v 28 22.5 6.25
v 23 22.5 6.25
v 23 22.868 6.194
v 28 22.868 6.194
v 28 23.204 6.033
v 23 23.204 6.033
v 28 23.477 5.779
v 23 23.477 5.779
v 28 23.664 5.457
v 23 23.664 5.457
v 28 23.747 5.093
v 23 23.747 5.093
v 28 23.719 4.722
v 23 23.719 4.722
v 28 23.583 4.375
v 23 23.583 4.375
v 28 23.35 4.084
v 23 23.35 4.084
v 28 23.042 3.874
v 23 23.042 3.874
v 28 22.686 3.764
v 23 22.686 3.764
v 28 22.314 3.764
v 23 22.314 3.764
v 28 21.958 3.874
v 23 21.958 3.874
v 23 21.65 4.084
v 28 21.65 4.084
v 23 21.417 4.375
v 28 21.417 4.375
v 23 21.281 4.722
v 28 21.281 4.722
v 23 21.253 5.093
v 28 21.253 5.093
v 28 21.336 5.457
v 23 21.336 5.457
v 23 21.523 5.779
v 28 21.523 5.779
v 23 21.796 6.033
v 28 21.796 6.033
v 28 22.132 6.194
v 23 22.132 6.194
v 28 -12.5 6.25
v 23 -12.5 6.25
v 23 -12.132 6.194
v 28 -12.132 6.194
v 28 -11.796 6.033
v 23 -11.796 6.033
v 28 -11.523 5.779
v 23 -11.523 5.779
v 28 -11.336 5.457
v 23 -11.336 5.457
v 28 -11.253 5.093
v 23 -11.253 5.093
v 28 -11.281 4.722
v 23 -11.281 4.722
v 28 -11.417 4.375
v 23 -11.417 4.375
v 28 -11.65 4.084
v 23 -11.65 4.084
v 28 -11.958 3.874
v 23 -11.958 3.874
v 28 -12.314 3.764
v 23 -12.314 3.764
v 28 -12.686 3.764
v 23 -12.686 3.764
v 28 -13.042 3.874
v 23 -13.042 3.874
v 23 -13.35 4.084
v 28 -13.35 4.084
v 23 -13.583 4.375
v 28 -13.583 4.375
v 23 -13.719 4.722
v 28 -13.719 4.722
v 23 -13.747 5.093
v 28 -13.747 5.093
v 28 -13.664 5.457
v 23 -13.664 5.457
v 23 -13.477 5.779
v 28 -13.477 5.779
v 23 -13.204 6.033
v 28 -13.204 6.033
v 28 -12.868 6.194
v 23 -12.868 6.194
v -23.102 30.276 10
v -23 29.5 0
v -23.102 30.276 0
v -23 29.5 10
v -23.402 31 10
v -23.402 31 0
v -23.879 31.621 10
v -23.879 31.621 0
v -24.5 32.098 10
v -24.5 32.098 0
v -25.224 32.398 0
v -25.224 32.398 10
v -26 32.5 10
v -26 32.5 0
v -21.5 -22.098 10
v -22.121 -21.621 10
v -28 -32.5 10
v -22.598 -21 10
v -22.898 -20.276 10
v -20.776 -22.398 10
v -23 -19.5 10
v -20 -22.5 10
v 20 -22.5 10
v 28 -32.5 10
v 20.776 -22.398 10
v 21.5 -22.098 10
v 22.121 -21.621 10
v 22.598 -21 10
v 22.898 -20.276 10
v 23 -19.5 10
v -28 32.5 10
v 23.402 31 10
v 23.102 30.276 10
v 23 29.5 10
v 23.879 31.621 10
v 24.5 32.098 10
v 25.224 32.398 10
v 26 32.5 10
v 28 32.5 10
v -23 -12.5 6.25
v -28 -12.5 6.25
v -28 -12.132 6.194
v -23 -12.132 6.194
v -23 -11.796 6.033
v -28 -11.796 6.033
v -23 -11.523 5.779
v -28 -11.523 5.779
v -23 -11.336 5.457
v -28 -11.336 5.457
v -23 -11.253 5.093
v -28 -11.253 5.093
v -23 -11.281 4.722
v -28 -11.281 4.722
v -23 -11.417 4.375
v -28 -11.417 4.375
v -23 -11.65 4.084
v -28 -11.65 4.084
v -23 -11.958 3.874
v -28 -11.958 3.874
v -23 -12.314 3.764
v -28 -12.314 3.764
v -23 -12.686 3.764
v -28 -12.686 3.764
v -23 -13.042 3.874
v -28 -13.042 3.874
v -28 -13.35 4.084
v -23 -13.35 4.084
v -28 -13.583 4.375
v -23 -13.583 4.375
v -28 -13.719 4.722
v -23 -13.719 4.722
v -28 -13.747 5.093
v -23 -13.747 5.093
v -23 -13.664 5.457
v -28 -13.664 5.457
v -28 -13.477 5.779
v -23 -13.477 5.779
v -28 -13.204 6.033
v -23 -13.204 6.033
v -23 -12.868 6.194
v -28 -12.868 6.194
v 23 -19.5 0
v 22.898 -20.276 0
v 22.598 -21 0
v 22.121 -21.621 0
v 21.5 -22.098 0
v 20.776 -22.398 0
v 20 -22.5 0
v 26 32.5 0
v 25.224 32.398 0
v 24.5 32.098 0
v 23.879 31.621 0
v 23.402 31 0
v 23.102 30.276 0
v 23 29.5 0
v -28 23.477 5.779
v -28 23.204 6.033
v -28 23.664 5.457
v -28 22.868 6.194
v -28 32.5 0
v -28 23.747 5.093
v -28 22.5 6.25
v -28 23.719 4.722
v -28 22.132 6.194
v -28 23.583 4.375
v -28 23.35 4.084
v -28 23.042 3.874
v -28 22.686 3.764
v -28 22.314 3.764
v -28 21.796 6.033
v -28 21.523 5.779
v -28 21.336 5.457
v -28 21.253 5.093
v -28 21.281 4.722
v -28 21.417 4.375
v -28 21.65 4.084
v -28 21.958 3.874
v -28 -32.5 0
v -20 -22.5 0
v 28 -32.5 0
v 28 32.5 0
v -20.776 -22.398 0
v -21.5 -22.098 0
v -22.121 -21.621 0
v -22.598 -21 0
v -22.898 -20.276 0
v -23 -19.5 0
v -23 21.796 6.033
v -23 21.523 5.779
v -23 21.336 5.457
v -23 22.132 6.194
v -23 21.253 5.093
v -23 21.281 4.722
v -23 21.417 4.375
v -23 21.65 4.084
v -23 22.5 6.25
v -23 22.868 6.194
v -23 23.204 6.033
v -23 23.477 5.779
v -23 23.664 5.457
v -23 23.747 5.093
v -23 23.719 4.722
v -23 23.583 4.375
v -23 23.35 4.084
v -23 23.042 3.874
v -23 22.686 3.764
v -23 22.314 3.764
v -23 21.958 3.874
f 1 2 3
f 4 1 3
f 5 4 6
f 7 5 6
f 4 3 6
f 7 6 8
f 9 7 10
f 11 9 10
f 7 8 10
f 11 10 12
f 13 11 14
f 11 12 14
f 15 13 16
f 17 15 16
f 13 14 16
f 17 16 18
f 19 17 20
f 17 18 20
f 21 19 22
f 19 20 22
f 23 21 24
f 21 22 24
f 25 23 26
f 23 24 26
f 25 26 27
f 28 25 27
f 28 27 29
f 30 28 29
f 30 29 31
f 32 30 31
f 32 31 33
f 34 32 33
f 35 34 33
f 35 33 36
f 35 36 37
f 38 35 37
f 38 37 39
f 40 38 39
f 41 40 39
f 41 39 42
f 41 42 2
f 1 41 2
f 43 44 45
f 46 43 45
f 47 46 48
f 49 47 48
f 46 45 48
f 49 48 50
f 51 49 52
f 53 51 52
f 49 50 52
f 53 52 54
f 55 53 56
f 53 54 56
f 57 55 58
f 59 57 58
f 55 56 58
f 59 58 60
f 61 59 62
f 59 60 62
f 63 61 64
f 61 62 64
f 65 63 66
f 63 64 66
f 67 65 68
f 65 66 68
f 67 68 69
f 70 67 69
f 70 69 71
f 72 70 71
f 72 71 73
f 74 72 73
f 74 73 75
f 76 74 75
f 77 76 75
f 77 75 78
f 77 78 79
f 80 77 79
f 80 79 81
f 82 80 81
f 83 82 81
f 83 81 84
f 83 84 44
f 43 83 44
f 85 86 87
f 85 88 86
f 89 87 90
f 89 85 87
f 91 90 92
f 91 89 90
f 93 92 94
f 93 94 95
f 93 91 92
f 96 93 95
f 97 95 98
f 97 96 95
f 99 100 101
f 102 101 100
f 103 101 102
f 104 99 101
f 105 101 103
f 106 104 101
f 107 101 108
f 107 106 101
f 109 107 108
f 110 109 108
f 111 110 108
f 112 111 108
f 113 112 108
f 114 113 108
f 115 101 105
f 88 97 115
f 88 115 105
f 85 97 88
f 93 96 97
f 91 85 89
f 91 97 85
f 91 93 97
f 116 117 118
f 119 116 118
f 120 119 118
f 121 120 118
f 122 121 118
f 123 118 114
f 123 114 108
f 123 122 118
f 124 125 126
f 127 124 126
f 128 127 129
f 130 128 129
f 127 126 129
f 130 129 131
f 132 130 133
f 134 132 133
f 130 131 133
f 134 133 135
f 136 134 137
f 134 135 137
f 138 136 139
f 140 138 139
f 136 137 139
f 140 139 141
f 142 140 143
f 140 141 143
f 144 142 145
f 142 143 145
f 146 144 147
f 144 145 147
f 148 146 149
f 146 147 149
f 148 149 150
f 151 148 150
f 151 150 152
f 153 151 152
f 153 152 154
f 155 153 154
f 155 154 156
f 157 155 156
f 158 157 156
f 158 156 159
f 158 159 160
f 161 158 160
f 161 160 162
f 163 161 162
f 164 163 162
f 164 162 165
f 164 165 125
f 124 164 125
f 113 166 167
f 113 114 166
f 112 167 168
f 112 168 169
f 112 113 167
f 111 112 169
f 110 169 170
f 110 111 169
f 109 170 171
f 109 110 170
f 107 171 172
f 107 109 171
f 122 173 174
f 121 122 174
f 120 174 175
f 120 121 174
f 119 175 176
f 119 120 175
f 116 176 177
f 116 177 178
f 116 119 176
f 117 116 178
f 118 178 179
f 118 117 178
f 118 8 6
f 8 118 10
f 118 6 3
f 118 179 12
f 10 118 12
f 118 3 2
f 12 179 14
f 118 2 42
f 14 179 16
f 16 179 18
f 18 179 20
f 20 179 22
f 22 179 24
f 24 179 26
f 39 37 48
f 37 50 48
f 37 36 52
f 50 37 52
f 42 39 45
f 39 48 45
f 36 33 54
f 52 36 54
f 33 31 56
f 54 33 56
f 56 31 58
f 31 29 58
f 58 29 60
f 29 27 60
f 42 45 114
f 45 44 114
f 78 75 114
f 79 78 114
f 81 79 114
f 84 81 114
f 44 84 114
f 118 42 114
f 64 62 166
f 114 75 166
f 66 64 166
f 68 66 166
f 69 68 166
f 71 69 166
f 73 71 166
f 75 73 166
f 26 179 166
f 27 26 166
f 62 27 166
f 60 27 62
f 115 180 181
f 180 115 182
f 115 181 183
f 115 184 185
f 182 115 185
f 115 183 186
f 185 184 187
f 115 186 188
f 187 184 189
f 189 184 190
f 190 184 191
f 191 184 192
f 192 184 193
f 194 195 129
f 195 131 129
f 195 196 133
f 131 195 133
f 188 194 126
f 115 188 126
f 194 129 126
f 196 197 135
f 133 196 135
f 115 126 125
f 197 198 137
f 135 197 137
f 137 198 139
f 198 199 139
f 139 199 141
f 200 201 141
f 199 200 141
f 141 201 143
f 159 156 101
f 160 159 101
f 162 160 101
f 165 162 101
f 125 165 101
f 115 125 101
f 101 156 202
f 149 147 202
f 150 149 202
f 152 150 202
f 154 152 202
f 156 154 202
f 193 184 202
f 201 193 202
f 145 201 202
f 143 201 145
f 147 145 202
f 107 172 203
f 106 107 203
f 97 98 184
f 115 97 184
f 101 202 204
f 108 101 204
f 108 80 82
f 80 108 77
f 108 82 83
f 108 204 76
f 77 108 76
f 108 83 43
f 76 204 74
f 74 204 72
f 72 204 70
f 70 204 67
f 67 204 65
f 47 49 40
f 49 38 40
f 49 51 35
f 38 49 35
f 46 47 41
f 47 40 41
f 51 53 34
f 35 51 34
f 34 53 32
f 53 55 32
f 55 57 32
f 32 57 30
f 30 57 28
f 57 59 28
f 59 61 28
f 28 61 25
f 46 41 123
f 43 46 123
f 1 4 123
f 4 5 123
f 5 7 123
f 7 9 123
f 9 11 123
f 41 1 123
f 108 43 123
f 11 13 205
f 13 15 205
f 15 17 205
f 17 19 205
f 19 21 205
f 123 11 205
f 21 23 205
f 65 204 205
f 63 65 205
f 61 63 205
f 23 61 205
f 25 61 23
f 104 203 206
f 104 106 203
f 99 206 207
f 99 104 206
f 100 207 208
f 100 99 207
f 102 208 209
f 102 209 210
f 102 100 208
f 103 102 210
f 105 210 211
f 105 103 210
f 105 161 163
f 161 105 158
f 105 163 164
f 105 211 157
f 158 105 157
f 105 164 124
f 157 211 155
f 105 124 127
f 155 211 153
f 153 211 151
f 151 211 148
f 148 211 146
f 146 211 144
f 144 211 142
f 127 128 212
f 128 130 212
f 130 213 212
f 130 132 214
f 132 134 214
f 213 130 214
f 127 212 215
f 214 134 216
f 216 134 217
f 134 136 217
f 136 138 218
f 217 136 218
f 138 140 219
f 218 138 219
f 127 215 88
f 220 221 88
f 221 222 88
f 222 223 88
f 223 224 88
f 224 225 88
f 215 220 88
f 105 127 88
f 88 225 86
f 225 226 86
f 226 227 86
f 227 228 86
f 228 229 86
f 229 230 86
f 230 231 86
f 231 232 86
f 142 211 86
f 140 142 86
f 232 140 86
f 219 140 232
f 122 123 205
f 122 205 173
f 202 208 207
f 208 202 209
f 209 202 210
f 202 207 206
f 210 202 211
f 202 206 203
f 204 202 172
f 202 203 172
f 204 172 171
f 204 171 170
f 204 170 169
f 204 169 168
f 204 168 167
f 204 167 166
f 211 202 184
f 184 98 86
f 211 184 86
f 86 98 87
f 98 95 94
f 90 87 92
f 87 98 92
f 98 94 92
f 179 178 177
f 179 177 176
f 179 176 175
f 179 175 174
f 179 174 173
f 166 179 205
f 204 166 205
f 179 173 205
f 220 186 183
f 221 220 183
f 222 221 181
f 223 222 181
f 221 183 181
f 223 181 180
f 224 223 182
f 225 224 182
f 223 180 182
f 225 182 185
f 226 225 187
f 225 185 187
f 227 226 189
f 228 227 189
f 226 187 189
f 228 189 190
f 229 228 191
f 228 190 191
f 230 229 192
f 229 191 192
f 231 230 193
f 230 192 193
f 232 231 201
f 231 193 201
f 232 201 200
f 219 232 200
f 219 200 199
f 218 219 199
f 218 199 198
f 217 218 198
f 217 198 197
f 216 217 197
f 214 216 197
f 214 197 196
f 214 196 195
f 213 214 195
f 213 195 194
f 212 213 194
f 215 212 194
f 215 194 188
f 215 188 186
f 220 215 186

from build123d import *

# Parameters (mm, degrees)
EXTRUDE_1_DEPTH = 10
FILLET_1_R      = 3
M3X0_52_D       = 2.5


with BuildPart() as part:
    # Эскиз1 → Бобышка-Вытянуть1 (new body)
    with BuildSketch(Plane.XY):
        Polygon((28, 32.5), (23, 32.5), (23, -22.5), (-23, -22.5), (-23, 32.5), (-28, 32.5), (-28, -32.5), (28, -32.5), align=None)
    extrude(amount=EXTRUDE_1_DEPTH)

    # Скругление1
    fillet_1_edges = [part.edges().sort_by_distance(p)[0] for p in [
        (-23, 32.5, 5),
        (-23, -22.5, 5),
        (23, -22.5, 5),
        (23, 32.5, 5),
    ]]
    fillet(fillet_1_edges, radius=FILLET_1_R)

    # Отверстие обработанное метчиком M3x0.52 (through all)
    with Locations(Plane(origin=(28, 0, 0), x_dir=(0, 0, -1), z_dir=(1, 0, 0))):
        with Locations((-5, 22.5), (-5, -12.5)):
            Hole(M3X0_52_D / 2)


solid = part.part
